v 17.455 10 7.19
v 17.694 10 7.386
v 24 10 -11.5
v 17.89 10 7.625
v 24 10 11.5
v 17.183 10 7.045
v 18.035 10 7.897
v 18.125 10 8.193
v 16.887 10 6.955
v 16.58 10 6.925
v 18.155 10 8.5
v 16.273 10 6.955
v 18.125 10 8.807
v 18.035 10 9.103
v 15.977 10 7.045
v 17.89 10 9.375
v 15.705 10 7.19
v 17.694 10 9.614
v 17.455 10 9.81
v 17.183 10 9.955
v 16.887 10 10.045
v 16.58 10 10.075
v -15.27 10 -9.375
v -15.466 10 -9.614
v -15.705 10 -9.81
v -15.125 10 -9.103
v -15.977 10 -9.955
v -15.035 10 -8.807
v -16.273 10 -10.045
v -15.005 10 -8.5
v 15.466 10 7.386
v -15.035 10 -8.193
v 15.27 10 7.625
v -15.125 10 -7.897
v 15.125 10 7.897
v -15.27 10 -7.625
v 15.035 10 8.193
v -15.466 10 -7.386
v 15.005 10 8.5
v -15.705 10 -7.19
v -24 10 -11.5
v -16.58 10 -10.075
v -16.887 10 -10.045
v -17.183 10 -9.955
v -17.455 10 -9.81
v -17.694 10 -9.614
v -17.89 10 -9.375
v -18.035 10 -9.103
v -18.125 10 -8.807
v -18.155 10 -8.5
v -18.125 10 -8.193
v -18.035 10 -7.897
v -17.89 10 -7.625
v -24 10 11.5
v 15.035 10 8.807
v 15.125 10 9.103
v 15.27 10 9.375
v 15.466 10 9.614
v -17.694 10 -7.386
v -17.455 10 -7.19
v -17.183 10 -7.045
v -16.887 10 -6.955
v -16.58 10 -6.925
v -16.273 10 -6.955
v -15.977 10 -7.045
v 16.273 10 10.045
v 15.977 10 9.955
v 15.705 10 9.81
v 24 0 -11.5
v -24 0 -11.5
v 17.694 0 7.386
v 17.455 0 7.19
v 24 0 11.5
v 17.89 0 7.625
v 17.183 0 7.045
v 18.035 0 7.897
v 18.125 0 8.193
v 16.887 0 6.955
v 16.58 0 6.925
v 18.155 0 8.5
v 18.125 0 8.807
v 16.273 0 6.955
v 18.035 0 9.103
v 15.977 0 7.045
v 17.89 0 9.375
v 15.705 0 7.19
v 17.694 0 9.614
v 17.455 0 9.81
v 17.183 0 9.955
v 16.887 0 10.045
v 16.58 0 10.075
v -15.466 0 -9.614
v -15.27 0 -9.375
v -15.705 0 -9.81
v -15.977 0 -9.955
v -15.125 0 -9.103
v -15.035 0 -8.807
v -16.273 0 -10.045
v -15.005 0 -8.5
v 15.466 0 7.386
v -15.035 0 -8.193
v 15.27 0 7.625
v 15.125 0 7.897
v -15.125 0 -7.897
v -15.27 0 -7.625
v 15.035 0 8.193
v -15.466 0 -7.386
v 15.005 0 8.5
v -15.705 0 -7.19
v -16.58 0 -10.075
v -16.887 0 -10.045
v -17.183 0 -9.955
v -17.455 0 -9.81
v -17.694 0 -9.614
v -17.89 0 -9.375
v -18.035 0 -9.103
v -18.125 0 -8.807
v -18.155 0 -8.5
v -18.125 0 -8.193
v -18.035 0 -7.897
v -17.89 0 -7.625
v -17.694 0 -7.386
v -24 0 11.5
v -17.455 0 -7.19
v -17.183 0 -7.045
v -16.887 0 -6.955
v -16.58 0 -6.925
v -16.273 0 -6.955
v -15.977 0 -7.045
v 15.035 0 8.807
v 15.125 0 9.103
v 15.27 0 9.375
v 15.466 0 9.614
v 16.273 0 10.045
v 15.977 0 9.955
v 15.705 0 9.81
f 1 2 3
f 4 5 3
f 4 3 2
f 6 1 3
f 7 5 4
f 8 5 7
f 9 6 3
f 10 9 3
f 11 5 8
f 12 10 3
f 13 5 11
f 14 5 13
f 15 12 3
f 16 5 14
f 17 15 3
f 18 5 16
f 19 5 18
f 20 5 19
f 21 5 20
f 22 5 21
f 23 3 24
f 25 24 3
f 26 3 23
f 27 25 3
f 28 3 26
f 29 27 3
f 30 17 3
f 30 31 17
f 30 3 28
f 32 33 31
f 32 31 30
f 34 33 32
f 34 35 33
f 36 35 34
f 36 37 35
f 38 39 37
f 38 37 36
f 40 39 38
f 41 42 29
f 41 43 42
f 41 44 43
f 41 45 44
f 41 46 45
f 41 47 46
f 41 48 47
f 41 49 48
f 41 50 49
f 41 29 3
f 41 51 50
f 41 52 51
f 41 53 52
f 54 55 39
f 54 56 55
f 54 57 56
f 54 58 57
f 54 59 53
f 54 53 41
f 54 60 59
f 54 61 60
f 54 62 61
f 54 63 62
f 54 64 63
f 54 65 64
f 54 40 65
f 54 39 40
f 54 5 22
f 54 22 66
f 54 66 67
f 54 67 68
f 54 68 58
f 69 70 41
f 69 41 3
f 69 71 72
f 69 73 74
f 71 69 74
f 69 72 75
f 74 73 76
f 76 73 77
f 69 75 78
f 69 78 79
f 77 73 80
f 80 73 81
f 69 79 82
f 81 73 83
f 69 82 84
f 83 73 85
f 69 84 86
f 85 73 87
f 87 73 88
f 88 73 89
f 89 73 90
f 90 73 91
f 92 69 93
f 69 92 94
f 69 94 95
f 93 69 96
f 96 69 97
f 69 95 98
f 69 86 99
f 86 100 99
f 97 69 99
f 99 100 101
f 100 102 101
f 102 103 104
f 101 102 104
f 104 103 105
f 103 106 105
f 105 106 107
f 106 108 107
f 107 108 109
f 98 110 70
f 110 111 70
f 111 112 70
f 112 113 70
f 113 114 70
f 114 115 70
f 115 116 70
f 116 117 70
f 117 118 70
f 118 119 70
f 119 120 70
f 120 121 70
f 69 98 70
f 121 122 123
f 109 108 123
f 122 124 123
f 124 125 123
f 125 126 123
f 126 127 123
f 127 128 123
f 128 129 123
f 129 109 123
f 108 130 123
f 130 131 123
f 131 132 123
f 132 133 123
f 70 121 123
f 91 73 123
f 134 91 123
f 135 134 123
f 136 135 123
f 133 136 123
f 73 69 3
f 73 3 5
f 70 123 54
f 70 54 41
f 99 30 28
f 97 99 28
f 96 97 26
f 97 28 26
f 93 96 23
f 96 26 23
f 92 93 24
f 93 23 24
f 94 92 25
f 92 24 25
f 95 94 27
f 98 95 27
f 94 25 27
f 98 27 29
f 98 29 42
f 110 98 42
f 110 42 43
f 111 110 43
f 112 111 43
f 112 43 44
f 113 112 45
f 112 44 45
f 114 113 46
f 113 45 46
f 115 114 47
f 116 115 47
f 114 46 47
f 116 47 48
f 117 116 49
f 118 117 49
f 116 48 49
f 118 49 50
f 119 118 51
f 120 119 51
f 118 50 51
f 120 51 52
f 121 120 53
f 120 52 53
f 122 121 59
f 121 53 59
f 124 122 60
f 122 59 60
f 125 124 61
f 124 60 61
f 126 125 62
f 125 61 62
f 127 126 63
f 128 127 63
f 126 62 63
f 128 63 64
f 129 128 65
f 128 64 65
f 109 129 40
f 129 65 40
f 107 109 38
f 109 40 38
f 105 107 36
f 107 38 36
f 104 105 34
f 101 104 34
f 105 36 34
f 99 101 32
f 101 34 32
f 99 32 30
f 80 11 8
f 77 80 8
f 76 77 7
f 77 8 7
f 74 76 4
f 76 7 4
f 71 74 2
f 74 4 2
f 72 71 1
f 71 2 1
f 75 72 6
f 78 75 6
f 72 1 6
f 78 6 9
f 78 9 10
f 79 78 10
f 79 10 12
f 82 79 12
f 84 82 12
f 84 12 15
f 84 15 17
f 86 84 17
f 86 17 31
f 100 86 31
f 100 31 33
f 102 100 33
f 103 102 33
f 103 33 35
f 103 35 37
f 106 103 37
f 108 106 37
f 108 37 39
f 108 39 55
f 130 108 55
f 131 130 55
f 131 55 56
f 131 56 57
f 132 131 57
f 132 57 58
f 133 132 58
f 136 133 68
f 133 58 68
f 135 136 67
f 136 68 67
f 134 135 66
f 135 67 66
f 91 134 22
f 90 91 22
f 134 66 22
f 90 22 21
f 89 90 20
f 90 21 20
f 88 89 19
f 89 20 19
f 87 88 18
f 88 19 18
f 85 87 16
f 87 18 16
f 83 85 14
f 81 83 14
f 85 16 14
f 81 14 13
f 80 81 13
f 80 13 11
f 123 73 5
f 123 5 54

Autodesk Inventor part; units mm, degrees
ref_plane "YZ Plane" through (0, 0, 0) normal (1, 0, 0) x (0, 1, 0)
ref_plane "XZ Plane" through (0, 0, 0) normal (0, 1, 0) x (-1, 0, 0)
ref_plane "XY Plane" through (0, 0, 0) normal (0, 0, 1) x (1, 0, 0)
sketch "Эскиз1" plane through (0, 0, 0) normal (0, 1, 0) x (-1, 0, 0)
  line L0 (24, -11.5) -> (-24, -11.5)
  line L1 (-24, -11.5) -> (-24, 11.5)
  line L2 (-24, 11.5) -> (24, 11.5)
  line L3 (24, 11.5) -> (24, -11.5)
  line L4 (24, -11.5) -> (-24, 11.5) construction
  line L5 (-24, -11.5) -> (24, 11.5) construction
  point P0 (0, 0)
  dimension "d0" = 48
  dimension "d1" = 23
extrude "Выдавливание1" add sketch "Эскиз1" along normal blind 10
sketch "Эскиз2" plane through (0, 10, 0) normal (0, 1, 0) x (1, 0, 0)
  circle A0 centre (16.58, -8.5) radius 1.575
  circle A1 centre (-16.58, 8.5) radius 1.575
  line L0 (24, -11.5) -> (24, 11.5) projected
  line L1 (-24, -11.5) -> (24, -11.5) projected
  line L2 (24, 11.5) -> (-24, 11.5) projected
  line L3 (-24, 11.5) -> (-24, -11.5) projected
  point P0 (0, 0)
  dimension "d4" = 3.15
  dimension "d5" = 3.15
  dimension "d6" = 40.58
  dimension "d7" = 20
  dimension "d8" = 20
  dimension "d9" = 40.58
extrude "Выдавливание2" cut sketch "Эскиз2" against normal blind 10 contours A0 | A1
properties part number "стабилизатор"
